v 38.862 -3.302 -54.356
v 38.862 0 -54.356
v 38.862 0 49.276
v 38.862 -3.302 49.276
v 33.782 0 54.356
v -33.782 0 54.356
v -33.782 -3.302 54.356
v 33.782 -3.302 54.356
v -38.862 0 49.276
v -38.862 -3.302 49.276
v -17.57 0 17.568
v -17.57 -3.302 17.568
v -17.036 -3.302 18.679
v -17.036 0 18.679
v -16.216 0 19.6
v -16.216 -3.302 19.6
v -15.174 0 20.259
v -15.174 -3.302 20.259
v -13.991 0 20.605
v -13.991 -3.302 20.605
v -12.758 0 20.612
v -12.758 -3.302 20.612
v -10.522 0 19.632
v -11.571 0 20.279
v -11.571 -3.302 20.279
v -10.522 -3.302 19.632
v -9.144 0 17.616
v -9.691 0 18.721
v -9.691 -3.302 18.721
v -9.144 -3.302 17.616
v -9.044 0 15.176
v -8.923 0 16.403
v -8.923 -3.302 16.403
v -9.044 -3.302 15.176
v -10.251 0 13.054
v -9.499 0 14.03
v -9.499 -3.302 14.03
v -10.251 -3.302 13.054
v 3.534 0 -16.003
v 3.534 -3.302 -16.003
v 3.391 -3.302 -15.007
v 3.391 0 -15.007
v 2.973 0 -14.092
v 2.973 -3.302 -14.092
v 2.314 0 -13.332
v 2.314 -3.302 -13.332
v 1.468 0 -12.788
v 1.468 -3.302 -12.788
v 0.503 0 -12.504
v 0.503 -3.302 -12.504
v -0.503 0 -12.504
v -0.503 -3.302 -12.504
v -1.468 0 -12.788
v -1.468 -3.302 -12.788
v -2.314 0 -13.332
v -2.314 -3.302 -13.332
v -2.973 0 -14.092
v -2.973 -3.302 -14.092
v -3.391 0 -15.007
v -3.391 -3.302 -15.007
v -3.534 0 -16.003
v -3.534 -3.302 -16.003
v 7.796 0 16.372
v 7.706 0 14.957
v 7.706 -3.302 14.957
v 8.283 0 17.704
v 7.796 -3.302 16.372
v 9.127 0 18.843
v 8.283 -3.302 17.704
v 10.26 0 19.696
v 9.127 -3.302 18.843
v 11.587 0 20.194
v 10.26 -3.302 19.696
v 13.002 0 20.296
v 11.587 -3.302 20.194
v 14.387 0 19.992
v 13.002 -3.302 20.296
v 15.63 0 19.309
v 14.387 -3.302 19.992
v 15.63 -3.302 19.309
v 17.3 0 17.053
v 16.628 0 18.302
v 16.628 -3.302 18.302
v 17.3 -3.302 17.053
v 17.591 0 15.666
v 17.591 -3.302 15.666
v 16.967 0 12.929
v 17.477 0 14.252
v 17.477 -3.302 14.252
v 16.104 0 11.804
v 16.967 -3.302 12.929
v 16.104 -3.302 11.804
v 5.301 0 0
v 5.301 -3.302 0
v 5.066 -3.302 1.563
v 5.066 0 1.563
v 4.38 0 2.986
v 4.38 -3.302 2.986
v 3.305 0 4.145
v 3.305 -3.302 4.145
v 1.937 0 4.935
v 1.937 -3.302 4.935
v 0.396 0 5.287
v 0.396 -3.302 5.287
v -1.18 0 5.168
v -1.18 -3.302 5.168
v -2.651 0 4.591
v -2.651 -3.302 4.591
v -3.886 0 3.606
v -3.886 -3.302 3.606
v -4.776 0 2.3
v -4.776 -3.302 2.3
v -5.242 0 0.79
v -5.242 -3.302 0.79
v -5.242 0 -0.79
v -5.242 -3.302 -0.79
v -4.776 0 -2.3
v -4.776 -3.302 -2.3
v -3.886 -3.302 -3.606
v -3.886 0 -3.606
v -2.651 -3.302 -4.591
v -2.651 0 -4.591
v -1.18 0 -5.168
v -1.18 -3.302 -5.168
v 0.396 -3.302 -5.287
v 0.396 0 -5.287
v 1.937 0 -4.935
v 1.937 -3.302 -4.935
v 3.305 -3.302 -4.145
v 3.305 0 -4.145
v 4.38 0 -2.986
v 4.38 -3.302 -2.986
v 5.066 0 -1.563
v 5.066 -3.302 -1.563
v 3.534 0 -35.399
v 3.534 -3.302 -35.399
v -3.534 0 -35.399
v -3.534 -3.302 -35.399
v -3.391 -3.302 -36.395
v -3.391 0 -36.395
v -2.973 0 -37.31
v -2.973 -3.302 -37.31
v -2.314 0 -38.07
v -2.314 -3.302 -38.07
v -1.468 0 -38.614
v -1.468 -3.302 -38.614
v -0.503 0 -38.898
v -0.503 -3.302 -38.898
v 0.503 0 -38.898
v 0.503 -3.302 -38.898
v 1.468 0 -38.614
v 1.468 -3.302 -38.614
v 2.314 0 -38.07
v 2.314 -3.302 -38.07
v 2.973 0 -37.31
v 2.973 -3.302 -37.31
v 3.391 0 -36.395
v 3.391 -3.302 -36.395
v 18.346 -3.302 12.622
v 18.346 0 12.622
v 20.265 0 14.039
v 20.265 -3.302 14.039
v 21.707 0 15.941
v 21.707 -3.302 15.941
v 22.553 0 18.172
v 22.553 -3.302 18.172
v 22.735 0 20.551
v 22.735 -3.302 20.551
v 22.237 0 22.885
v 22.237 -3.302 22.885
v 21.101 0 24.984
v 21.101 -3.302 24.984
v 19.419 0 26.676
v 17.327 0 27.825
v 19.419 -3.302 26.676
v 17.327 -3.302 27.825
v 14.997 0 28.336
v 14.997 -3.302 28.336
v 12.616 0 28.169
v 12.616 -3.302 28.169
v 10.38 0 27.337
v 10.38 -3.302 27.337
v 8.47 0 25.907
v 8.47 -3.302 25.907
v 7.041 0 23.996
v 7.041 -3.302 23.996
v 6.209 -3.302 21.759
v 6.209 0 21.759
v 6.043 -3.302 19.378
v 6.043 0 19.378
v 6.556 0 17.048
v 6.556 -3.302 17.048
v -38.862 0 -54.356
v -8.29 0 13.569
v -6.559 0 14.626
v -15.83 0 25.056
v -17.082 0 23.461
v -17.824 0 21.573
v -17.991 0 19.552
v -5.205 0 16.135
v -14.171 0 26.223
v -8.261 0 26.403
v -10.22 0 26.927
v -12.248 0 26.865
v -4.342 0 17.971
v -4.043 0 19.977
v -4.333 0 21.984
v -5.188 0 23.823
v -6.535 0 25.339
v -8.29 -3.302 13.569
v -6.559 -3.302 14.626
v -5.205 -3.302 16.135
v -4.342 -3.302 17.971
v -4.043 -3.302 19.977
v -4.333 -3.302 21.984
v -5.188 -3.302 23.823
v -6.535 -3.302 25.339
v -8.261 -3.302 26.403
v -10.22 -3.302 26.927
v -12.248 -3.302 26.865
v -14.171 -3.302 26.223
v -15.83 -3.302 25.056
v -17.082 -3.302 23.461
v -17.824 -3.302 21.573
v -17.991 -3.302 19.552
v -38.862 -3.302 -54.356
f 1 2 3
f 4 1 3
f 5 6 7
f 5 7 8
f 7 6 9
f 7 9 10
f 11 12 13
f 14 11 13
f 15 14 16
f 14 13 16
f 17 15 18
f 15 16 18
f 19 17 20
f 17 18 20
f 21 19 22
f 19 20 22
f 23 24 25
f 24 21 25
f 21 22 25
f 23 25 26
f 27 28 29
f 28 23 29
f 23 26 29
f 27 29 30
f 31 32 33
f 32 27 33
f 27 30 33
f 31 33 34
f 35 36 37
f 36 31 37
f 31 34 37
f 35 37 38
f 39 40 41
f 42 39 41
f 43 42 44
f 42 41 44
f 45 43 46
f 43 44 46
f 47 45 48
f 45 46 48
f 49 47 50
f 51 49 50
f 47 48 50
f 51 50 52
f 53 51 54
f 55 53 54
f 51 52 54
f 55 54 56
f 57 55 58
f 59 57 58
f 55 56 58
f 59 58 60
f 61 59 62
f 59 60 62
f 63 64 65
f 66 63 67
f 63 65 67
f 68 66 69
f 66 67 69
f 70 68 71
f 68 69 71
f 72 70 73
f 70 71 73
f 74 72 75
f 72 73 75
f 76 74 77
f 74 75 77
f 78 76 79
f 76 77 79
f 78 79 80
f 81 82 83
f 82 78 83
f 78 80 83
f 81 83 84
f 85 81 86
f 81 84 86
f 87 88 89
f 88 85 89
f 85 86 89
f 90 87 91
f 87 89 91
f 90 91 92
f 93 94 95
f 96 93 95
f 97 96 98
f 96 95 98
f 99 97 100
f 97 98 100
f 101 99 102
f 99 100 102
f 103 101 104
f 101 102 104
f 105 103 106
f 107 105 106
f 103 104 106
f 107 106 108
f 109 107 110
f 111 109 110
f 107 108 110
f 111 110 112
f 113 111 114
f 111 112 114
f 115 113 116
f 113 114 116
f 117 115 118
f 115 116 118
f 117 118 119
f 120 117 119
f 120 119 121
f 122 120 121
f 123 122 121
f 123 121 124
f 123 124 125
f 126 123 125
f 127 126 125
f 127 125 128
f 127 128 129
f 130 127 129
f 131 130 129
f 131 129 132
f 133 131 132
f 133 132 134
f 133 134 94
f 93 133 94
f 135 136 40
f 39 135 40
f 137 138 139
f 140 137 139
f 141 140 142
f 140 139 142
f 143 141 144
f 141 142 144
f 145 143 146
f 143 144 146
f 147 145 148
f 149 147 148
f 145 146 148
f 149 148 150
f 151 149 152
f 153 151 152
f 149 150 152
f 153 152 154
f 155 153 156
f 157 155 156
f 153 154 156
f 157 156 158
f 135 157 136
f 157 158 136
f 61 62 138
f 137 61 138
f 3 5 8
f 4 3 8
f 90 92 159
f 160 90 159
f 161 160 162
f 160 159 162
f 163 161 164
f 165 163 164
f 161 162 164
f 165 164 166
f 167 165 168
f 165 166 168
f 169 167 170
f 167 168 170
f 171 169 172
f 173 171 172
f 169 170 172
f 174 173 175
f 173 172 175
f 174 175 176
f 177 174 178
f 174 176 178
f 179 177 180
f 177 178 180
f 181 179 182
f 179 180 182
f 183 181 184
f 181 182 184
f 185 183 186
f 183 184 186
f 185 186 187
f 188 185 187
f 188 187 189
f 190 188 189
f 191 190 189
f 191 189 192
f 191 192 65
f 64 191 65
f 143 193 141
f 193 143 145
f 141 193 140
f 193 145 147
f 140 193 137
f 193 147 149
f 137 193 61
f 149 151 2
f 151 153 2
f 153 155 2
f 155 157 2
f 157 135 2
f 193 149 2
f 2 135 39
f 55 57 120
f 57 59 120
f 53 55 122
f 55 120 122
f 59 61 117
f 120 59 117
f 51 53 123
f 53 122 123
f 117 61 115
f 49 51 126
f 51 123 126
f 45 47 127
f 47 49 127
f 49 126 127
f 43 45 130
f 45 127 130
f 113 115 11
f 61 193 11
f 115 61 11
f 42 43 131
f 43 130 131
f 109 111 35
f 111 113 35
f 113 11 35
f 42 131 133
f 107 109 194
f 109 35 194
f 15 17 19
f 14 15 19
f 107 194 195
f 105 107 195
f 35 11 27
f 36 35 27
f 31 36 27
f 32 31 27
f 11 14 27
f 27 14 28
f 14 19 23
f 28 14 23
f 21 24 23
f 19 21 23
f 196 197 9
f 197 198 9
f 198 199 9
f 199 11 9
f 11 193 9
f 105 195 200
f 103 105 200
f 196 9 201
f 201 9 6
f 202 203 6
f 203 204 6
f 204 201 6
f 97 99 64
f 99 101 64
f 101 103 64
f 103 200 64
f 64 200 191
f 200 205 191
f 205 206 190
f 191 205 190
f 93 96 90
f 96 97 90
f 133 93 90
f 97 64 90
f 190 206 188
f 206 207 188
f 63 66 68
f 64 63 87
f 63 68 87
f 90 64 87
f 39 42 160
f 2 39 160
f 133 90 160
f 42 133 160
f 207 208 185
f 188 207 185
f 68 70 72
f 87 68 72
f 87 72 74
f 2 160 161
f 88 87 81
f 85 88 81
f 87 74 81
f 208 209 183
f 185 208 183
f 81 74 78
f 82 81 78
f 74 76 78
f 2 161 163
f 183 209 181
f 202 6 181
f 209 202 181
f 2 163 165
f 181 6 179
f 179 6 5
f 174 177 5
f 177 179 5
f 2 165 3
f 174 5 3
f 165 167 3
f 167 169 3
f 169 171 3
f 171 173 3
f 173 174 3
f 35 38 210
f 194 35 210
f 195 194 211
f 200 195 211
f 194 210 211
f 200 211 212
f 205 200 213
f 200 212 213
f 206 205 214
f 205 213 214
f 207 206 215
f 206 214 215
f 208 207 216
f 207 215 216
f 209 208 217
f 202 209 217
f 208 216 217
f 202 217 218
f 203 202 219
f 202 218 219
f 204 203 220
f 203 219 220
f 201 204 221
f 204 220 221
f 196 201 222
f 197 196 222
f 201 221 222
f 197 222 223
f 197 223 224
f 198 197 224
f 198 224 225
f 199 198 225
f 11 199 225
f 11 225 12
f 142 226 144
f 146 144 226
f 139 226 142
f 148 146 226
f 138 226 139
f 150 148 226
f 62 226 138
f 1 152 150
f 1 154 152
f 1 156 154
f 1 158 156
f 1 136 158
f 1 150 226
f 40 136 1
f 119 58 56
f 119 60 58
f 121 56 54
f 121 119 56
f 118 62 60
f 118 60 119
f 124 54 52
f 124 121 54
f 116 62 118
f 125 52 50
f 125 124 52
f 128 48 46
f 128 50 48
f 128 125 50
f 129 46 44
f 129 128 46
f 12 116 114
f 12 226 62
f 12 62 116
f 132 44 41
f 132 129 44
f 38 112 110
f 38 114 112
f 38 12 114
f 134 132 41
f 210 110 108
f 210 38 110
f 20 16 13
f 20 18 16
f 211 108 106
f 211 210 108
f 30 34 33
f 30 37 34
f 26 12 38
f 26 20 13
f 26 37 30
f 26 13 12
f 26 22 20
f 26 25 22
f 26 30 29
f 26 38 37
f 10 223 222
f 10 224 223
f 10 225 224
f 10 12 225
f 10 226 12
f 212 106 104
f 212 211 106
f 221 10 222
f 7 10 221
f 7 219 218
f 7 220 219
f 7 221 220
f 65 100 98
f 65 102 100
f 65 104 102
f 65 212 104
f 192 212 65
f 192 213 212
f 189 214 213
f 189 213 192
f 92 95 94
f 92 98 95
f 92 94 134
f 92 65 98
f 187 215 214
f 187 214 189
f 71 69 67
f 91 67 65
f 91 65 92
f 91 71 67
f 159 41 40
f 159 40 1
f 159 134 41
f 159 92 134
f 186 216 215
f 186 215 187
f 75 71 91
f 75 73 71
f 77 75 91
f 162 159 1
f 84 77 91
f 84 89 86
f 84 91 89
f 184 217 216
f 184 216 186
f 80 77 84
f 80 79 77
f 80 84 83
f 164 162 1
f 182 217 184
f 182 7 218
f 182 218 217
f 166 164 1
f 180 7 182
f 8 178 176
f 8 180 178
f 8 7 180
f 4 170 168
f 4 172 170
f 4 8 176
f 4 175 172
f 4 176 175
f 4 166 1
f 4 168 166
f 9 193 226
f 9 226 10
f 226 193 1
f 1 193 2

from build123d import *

# Parameters (mm, degrees)
F0_W     = 77.724
F0_H     = 108.712
F1_DEPTH = 3.302
F3_R     = 13.3445871966
F4_DEPTH = 3.302
F5_SIZE  = 5.08
F6_R     = 5.3013887341
F7_DEPTH = 3.303


with BuildPart() as f1:
    # F0 (on Front) → F1 (new body)
    with BuildSketch(Plane.XZ):
        Rectangle(F0_W, F0_H)
    extrude(amount=F1_DEPTH)

    # F3 (on face) → F4 (join)
    with BuildSketch(Plane.XZ.offset(3.302)):
        with BuildLine():
            add(Edge.make_bspline(
                [(-33.1284857231, -24.3833554431), (-30.3980902484, -23.448268281), (-27.6625298974, -23.0135580616), (-24.9168122419, -22.8877504962)],
                knots=[0.0236239796, 0.0236239796, 0.0236239796, 0.0236239796, 0.1438563975, 0.1438563975, 0.1438563975, 0.1438563975], degree=3))
            ThreePointArc((-33.1284857231, -24.3833554431), (-29.1410849834, -38.4326879001), (-15.8749999992, -44.5395771521))
            ThreePointArc((-15.8749999992, -44.5395771521), (-7.7803065213, -45.3411097626), (9e-10, -47.7145771515))
            ThreePointArc((9e-10, -47.7145771515), (7.780306523, -45.3411097624), (15.8750000008, -44.5395771515))
            ThreePointArc((15.8750000008, -44.5395771515), (28.9710149024, -38.6284104056), (33.2008619827, -24.8968448621))
            add(Edge.make_bspline(
                [(22.7832318895, -28.264905571), (26.870414184, -28.3483991479), (30.7081117423, -27.7740633769), (33.2008619827, -24.8968448621)],
                knots=[0.8224951004, 0.8224951004, 0.8224951004, 0.8224951004, 0.9908039431, 0.9908039431, 0.9908039431, 0.9908039431], degree=3))
            add(Edge.make_bspline(
                [(15.9953683619, -27.7933645546), (16.7598950609, -27.862629463), (19.0104314318, -28.0581684328), (21.3052242348, -28.2347126075), (22.7832318895, -28.264905571)],
                knots=[0.7300371536, 0.7300371536, 0.7300371536, 0.7300371536, 0.7616312241, 0.8224951004, 0.8224951004, 0.8224951004, 0.8224951004], degree=3))
            add(Edge.make_bspline(
                [(12.0445173218, -27.4086319137), (13.3501324037, -27.5450763369), (14.6659309282, -27.6729196282), (15.9953683619, -27.7933645546)],
                knots=[0.6750981435, 0.6750981435, 0.6750981435, 0.6750981435, 0.7300371536, 0.7300371536, 0.7300371536, 0.7300371536], degree=3))
            add(Edge.make_bspline(
                [(6.5035843618, -26.7679947406), (8.3365045469, -27.0014140297), (10.1801283043, -27.2137923413), (12.0445173218, -27.4086319137)],
                knots=[0.5966464709, 0.5966464709, 0.5966464709, 0.5966464709, 0.6750981435, 0.6750981435, 0.6750981435, 0.6750981435], degree=3))
            add(Edge.make_bspline(
                [(-15.7821923495, -23.3437299796), (-10.5480047667, -23.9624284424), (-3.1004870846, -25.4363431139), (4.3262408996, -26.490713729), (6.5035843618, -26.7679947406)],
                knots=[0.2765511336, 0.2765511336, 0.2765511336, 0.2765511336, 0.5034529768, 0.5966464709, 0.5966464709, 0.5966464709, 0.5966464709], degree=3))
            add(Edge.make_bspline(
                [(-24.9168122419, -22.8877504962), (-22.5127229742, -22.777596192), (-19.4725911361, -22.9372512735), (-16.4147628171, -23.2689580365), (-15.7821923495, -23.3437299796)],
                knots=[0.1438563975, 0.1438563975, 0.1438563975, 0.1438563975, 0.2491292266, 0.2765511336, 0.2765511336, 0.2765511336, 0.2765511336], degree=3))
        make_face()
        with BuildLine():
            ThreePointArc((-24.3962783332, -9.4429305632), (-23.5493439512, -16.2082072875), (-24.9168122419, -22.8877504962))
            add(Edge.make_bspline(
                [(-24.9168122419, -22.8877504962), (-22.5127229742, -22.777596192), (-19.4725911361, -22.9372512735), (-16.4147628171, -23.2689580365), (-15.7821923495, -23.3437299796)],
                knots=[0.1438563975, 0.1438563975, 0.1438563975, 0.1438563975, 0.2491292266, 0.2765511336, 0.2765511336, 0.2765511336, 0.2765511336], degree=3))
            ThreePointArc((-15.7821923495, -23.3437299796), (-16.7909764629, -16.1431204561), (-15.7821923495, -8.9425109327))
            add(Edge.make_bspline(
                [(-20.8150930703, 3.0249084812), (-20.084698855, 3.2617064252), (-18.5750809579, 3.7511331524), (-20.1108934357, 5.7423249077), (-21.3989497629, 8.4805039988), (-19.5926222129, 8.6232034417), (-20.0960081308, 6.4882204736), (-17.9845367, 4.4717269755), (-19.4827279307, 7.4877563676), (-17.6531933794, 7.9935220173), (-17.6518746238, 3.7165445405), (-19.7201607312, 2.5442912986), (-19.0033211234, 0.5113026434), (-21.5358089244, 0.646088536), (-20.7796208818, -5.7027505195), (-14.9489180074, 0.0978196974), (-17.977030073, 1.5236381763), (-14.9168721562, 2.6666255778), (-16.1211586732, 6.3598723413), (-13.8328776174, 5.6005762962), (-15.1421128769, 3.3154322822), (-14.4747759607, 0.1624480587), (-13.8084140261, 5.1188240441), (-11.0343102947, 2.7331078221), (-14.5615723999, -0.162479085), (-17.3031216925, -3.3366762112), (-18.0975664008, -8.8898410691), (-13.4356882131, -5.5746333853), (-15.3648709473, -3.8082111356), (-12.0527139611, -3.6659211986), (-13.248535603, -1.079337143), (-9.5910344453, -1.7447413323), (-10.7422685487, 3.0079941618), (-8.9849464366, -1.96339633), (-8.8102943074, 5.4988116301), (-7.4861779197, -0.6957485248), (-9.6724060403, -0.966318494), (-11.0218385517, -3.5291741027), (-13.7004320012, -4.2797101397), (-12.8029593717, -6.9381020727), (-14.7089673153, -8.2196946287), (-15.7821923495, -8.9425109327)],
                knots=[0, 0, 0, 0, 0.0231511603, 0.0478500744, 0.0752755755, 0.0903366321, 0.1142638791, 0.1352244444, 0.1593040946, 0.1744947233, 0.2060790631, 0.2315955315, 0.2516703156, 0.2733460952, 0.3049833457, 0.3431527772, 0.3650886659, 0.3896180862, 0.4183185893, 0.4354180503, 0.4626318971, 0.4841465121, 0.512674348, 0.5346264378, 0.5675595767, 0.6056671213, 0.6368592747, 0.6681518224, 0.6879987795, 0.7121233264, 0.7334743783, 0.7591560932, 0.7848708559, 0.8073025156, 0.8374341523, 0.8673194844, 0.8904493251, 0.9187369989, 0.9444600919, 0.9686867066, 1, 1, 1, 1], degree=3))
            add(Edge.make_bspline(
                [(-25.8914344013, -2.4853385985), (-26.396572956, -2.0003344615), (-27.3138435109, -1.1196261405), (-29.1352849859, -2.0598979002), (-28.7106271057, 0.8204026064), (-32.0312644098, -1.1715068103), (-31.3002695814, 3.7485837155), (-29.4483178555, 3.8301118075), (-30.8071023081, 1.5653871303), (-28.9526334159, 1.3619840648), (-29.4792210737, 5.2085047756), (-26.921055424, 4.4342075194), (-28.8119762327, 2.2854028303), (-27.5906596289, -1.3990701213), (-27.7699356497, 3.0747016102), (-25.2099586785, 2.6066763518), (-26.5953437573, -0.395391095), (-23.7025988652, -2.0340069969), (-23.1772681034, -6.0499515041), (-20.5435134821, -4.1808959475), (-25.0748704565, 2.6489737746), (-20.1368344266, 0.7949418705), (-20.6048167244, 2.3336418411), (-20.8150930703, 3.0249084812)],
                knots=[0, 0, 0, 0, 0.0457250435, 0.0830311605, 0.1245988121, 0.1705511092, 0.2321726775, 0.2625557415, 0.30723362, 0.3358214151, 0.393012377, 0.4286583434, 0.4808472993, 0.5282384525, 0.5813000538, 0.6192860311, 0.6705302416, 0.7286736986, 0.7872738172, 0.8280557864, 0.9074882994, 0.958434574, 1, 1, 1, 1], degree=3))
            ThreePointArc((-25.8914344013, -2.4853385985), (-24.9290967698, -4.9824855111), (-24.3962783332, -7.6050683856))
            add(Edge.make_bspline(
                [(-24.3962783332, -9.4429305632), (-25.4357243907, -10.1342055857), (-27.412273175, -11.4486922391), (-27.4547789496, -7.4214675852), (-30.5466070306, -9.5733915774), (-30.4542370334, -5.4520792207), (-32.3177618611, -5.8417990903), (-32.7140680164, -4.2769830225), (-32.0543630337, -2.7007935171), (-32.1251676799, -4.5533058245), (-30.3843482976, -5.4648837492), (-32.0501040037, -1.6640768267), (-30.4436660674, -1.9005229869), (-30.1720801803, -6.5942041642), (-29.7456686663, -3.178537531), (-28.1334595609, -3.5814958653), (-29.8697325683, -5.6494579394), (-29.5018476184, -7.7306733995), (-27.2359049314, -6.3250302911), (-26.4788550338, -9.3239236743), (-25.0993332141, -8.1853413666), (-24.3962783332, -7.6050683856)],
                knots=[0, 0, 0, 0, 0.0670169121, 0.1274354192, 0.1840138636, 0.2505621343, 0.2960523516, 0.3441354147, 0.3840734056, 0.4287810373, 0.4665753725, 0.5348972739, 0.5667760176, 0.6369485958, 0.6883070256, 0.7231632661, 0.7842390879, 0.8324575559, 0.8851485442, 0.9414679355, 1, 1, 1, 1], degree=3))
        make_face()
        with BuildLine():
            add(Edge.make_bspline(
                [(-20.2924981713, -15.781018883), (-20.5370775999, -16.1379246214), (-20.134132622, -17.1534868603), (-20.8639151565, -18.5661521393), (-21.9358468203, -19.4575377926), (-22.3700864307, -21.8865095148), (-20.237349518, -21.5763362209), (-19.5672362136, -20.438180371), (-19.2965010699, -18.8033454883), (-19.7803037906, -17.8720601229), (-19.908738804, -16.4540465799), (-19.0188083322, -15.0649598827), (-20.0853771822, -15.4787748635), (-20.2924981713, -15.781018883)],
                knots=[0, 0, 0, 0, 0.0904118203, 0.1854248684, 0.2814922978, 0.3865094541, 0.4809925493, 0.5711470892, 0.6690619631, 0.748512495, 0.8439845899, 0.9234351565, 1, 1, 1, 1], degree=3))
        make_face(mode=Mode.SUBTRACT)
        with BuildLine():
            add(Edge.make_bspline(
                [(-22.3910957575, -11.5529615432), (-22.0568118654, -12.2037220004), (-21.1170784891, -12.8832887919), (-21.7129777335, -14.1967346716), (-20.5379115522, -14.568750962), (-20.4867607869, -13.5076873001), (-20.8432701563, -11.8831681267), (-21.6439811905, -11.2404808042), (-22.9718655512, -9.3501247732), (-22.6978835435, -10.9557285785), (-22.3910957575, -11.5529615432)],
                knots=[0, 0, 0, 0, 0.1505340204, 0.2658311351, 0.3614801071, 0.4617187858, 0.6051372816, 0.7298931385, 0.8618479683, 1, 1, 1, 1], degree=3))
        make_face(mode=Mode.SUBTRACT)
        with BuildLine():
            add(Edge.make_bspline(
                [(-18.3790698647, -10.1024601609), (-18.7969421772, -10.2564427963), (-19.1553590595, -11.577398565), (-19.219348267, -12.6506630096), (-19.2408550579, -13.9350019391), (-18.8743899715, -14.8858473731), (-18.2833235222, -14.0155234153), (-18.1315989973, -13.0706647968), (-18.7065283271, -12.3462231403), (-18.4694817034, -11.2210464666), (-17.1590443019, -10.374237249), (-18.0760721444, -9.9908079022), (-18.3790698647, -10.1024601609)],
                knots=[0, 0, 0, 0, 0.1240572212, 0.2333232805, 0.347818092, 0.428679644, 0.5131510602, 0.6107152668, 0.7012679009, 0.8047604962, 0.9100465523, 1, 1, 1, 1], degree=3))
        make_face(mode=Mode.SUBTRACT)
        with BuildLine():
            ThreePointArc((5.4403450859, -12.5461180708), (6.6092683485, -19.609411059), (6.5035843618, -26.7679947406))
            add(Edge.make_bspline(
                [(6.5035843618, -26.7679947406), (8.3365045469, -27.0014140297), (10.1801283043, -27.2137923413), (12.0445173218, -27.4086319137)],
                knots=[0.5966464709, 0.5966464709, 0.5966464709, 0.5966464709, 0.6750981435, 0.6750981435, 0.6750981435, 0.6750981435], degree=3))
            Line((12.0445173218, -27.4086319137), (12.0445173218, -21.4756764472))
            ThreePointArc((12.0445173218, -21.4756764472), (14.0199428419, -19.5002509271), (15.9953683619, -21.4756764472))
            Line((15.9953683619, -21.4756764472), (15.9953683619, -27.7933645546))
            add(Edge.make_bspline(
                [(15.9953683619, -27.7933645546), (16.7598950609, -27.862629463), (19.0104314318, -28.0581684328), (21.3052242348, -28.2347126075), (22.7832318895, -28.264905571)],
                knots=[0.7300371536, 0.7300371536, 0.7300371536, 0.7300371536, 0.7616312241, 0.8224951004, 0.8224951004, 0.8224951004, 0.8224951004], degree=3))
            ThreePointArc((22.7832318895, -28.264905571), (22.4736636829, -20.3696155623), (23.5801553445, -12.5461180708))
            Line((23.5801553445, -12.5461180708), (28.4554600831, -13.4531514135))
            ThreePointArc((28.4554600831, -13.4531514135), (31.673336573, -11.9989868814), (31.424967593, -8.4765393743))
            ThreePointArc((31.424967593, -8.4765393743), (29.2529740879, -8.2440657168), (29.0205004305, -10.4160592219))
            ThreePointArc((29.0205004305, -10.4160592219), (29.058069024, -11.9208265797), (27.614886003, -12.3485636115))
            ThreePointArc((27.614886003, -12.3485636115), (23.4712314741, -5.8636115848), (28.4554600831, 0))
            ThreePointArc((28.4554600831, 0), (23.3706331923, -0.6006945639), (18.2612345592, -0.9328753515))
            Line((18.2612345592, -0.9328753515), (21.109645709, 8.6648291047))
            Line((21.109645709, 8.6648291047), (22.7452469365, 8.179414619))
            ThreePointArc((22.7452469365, 8.179414619), (24.0675287583, 9.9087492795), (21.9295363303, 9.4988517773))
            ThreePointArc((21.9295363303, 9.4988517773), (17.0915933325, 15.0640837031), (15.5871994793, 22.2831070423))
            Line((15.5871994793, 22.2831070423), (14.8853833456, 29.6840668302))
            Line((14.8853833456, 29.6840668302), (17.9889984262, 30.165095753))
            Line((17.9889984262, 30.165095753), (17.720128815, 31.8998516907))
            Line((17.720128815, 31.8998516907), (14.8043116011, 31.4479295364))
            Line((14.8043116011, 31.4479295364), (14.2361351446, 35.1138234881))
            Line((14.2361351446, 35.1138234881), (12.1174789965, 34.7854532301))
            Line((12.1174789965, 34.7854532301), (12.6562453806, 31.3093140721))
            Line((12.6562453806, 31.3093140721), (10.0379107516, 30.7162171018))
            Line((10.0379107516, 30.7162171018), (10.2517836951, 29.4975203391))
            Line((10.2517836951, 29.4975203391), (12.7509497106, 29.9361068755))
            Line((12.7509497106, 29.9361068755), (14.0939988196, 22.2831070423))
            ThreePointArc((14.0939988196, 22.2831070423), (12.6245914015, 15.2177663733), (7.6988285058, 9.9437681912))
            ThreePointArc((7.6988285058, 9.9437681912), (5.5906171254, 10.4864212664), (6.8022884056, 8.6778637491))
            Line((6.8022884056, 8.6778637491), (8.4650181234, 9.060157463))
            Line((8.4650181234, 9.060157463), (10.762639533, -0.9330055424))
            ThreePointArc((10.762639533, -0.9330055424), (5.6515483018, -0.6008483836), (0.5650403473, 0))
            ThreePointArc((0.5650403473, 0), (5.5492689564, -5.8636115848), (1.4056144274, -12.3485636115))
            ThreePointArc((1.4056144274, -12.3485636115), (-0.0375685935, -11.9208265797), (0, -10.4160592219))
            ThreePointArc((0, -10.4160592219), (-0.2324736575, -8.2440657168), (-2.4044671625, -8.4765393743))
            ThreePointArc((-2.4044671625, -8.4765393743), (-2.6528361426, -11.9989868814), (0.5650403473, -13.4531514135))
            Line((0.5650403473, -13.4531514135), (5.4403450859, -12.5461180708))
        make_face()
        Polygon((9.1227404773, -7.4148867279), (8.4774624556, -4.9826856703), (9.749203307, -4.868891682), (10.3401336819, -7.1323132142), align=None, mode=Mode.SUBTRACT)
        Polygon((10.9397291529, -9.5362256838), (9.768018499, -9.8470877856), (9.2899553012, -8.0451578014), (10.461665955, -7.7342956997), align=None, mode=Mode.SUBTRACT)
        Polygon((12.2584053658, -7.3401992658), (12.7159978886, -9.0649705743), (11.5734964264, -9.3680832964), (11.1159039036, -7.6433119879), align=None, mode=Mode.SUBTRACT)
        Polygon((10.332212454, -4.8167246576), (11.5597705233, -4.7068840966), (12.1378842059, -6.8859273354), (10.9000811353, -7.0559568703), align=None, mode=Mode.SUBTRACT)
        Polygon((17.9045965268, -7.6433119879), (17.4470040041, -9.3680832964), (16.3045025419, -9.0649705743), (16.7620950646, -7.3401992658), align=None, mode=Mode.SUBTRACT)
        Polygon((18.5588344754, -7.7342956997), (19.7305451293, -8.0451578014), (19.2524819314, -9.8470877856), (18.0807712776, -9.5362256838), align=None, mode=Mode.SUBTRACT)
        Polygon((18.6803667486, -7.1323132142), (19.2712971234, -4.868891682), (20.5430379748, -4.9826856703), (19.8977599531, -7.4148867279), align=None, mode=Mode.SUBTRACT)
        Polygon((16.8826162245, -6.8859273354), (17.4607299071, -4.7068840966), (18.6882879764, -4.8167246576), (18.1204192951, -7.0559568703), align=None, mode=Mode.SUBTRACT)
        with BuildLine():
            ThreePointArc((14.2767767446, 4.6611620079), (12.1414040207, 5.7303494735), (11.1097303552, 7.8840968947))
            Line((11.1097303552, 7.8840968947), (14.2767767446, 7.8840968947))
            Line((14.2767767446, 7.8840968947), (14.2767767446, 4.6611620079))
        make_face(mode=Mode.SUBTRACT)
        with BuildLine():
            ThreePointArc((11.1459939594, 8.983289175), (12.2280091457, 10.9819830574), (14.2767767446, 11.9658963789))
            Line((14.2767767446, 11.9658963789), (14.2767767446, 8.983289175))
            Line((14.2767767446, 8.983289175), (11.1459939594, 8.983289175))
        make_face(mode=Mode.SUBTRACT)
        with BuildLine():
            ThreePointArc((18.430607267, 7.8840968947), (17.3673699452, 5.6986165643), (15.1747141111, 4.6502567644))
            Line((15.1747141111, 4.6502567644), (15.1747141111, 7.8840968947))
            Line((15.1747141111, 7.8840968947), (18.430607267, 7.8840968947))
        make_face(mode=Mode.SUBTRACT)
        with BuildLine():
            ThreePointArc((15.1747141111, 11.9768016224), (17.2797356479, 11.0126579566), (18.3943436628, 8.983289175))
            Line((18.3943436628, 8.983289175), (15.1747141111, 8.983289175))
            Line((15.1747141111, 8.983289175), (15.1747141111, 11.9768016224))
        make_face(mode=Mode.SUBTRACT)
        with BuildLine():
            ThreePointArc((1.5084841621, 28.7364097307), (5.1963193944, 39.8156504287), (15.8749999992, 44.5395771521))
            ThreePointArc((15.8749999992, 44.5395771521), (7.7803065213, 45.3411097626), (-9e-10, 47.7145771515))
            ThreePointArc((-9e-10, 47.7145771515), (-7.780306523, 45.3411097624), (-15.8750000008, 44.5395771515))
            ThreePointArc((-15.8750000008, 44.5395771515), (-30.2008361805, 37.0625327748), (-32.2586794783, 21.0343995142))
            ThreePointArc((-32.2586794783, 21.0343995142), (-31.4618060576, 11.8664205536), (-35.4362714152, 3.5663922047))
            ThreePointArc((-35.4362714152, 3.5663922047), (-26.8661908779, 8.4248419398), (-17.0921185192, 9.6570447531))
            ThreePointArc((-17.0921185192, 9.6570447531), (-3.3712650978, 14.8871009528), (1.5084841621, 28.7364097307))
        make_face()
        with Locations((-15.8750000008, 27.0770771515)):
            Circle(F3_R, mode=Mode.SUBTRACT)
    extrude(amount=-F4_DEPTH)

    # F5
    f5_edges = [f1.edges().sort_by_distance(p)[0] for p in [
        (-38.862, -1.651, 54.356),
        (38.862, -1.651, 54.356),
    ]]
    chamfer(f5_edges, length=F5_SIZE)

    # F6 (on face) → F7 (cut, through all)
    with BuildSketch(Plane.XZ.offset(3.302)):
        with BuildLine():
            ThreePointArc((7.7055875118, 14.9568890088), (14.3869519234, 19.9922658503), (16.1040185067, 11.804022285))
            ThreePointArc((16.1040185067, 11.804022285), (17.3273949812, 27.8248545003), (7.7055875118, 14.9568890088))
        make_face()
        with BuildLine():
            ThreePointArc((-17.5703578104, 17.5679231172), (-11.0237821937, 19.9922658503), (-10.2514803949, 13.0540643597))
            ThreePointArc((-10.2514803949, 13.0540643597), (-7.3591826587, 25.9341342636), (-17.5703578104, 17.5679231172))
        make_face()
        Circle(F6_R)
        with BuildLine():
            Line((3.534168005, -35.3993587196), (3.534168005, -16.0025767982))
            ThreePointArc((3.534168005, -16.0025767982), (0, -12.4684087932), (-3.534168005, -16.0025767982))
            Line((-3.534168005, -16.0025767982), (-3.534168005, -35.3993587196))
            ThreePointArc((-3.534168005, -35.3993587196), (0, -38.9335267246), (3.534168005, -35.3993587196))
        make_face()
    extrude(amount=-F7_DEPTH, mode=Mode.SUBTRACT)


solid = f1.part
